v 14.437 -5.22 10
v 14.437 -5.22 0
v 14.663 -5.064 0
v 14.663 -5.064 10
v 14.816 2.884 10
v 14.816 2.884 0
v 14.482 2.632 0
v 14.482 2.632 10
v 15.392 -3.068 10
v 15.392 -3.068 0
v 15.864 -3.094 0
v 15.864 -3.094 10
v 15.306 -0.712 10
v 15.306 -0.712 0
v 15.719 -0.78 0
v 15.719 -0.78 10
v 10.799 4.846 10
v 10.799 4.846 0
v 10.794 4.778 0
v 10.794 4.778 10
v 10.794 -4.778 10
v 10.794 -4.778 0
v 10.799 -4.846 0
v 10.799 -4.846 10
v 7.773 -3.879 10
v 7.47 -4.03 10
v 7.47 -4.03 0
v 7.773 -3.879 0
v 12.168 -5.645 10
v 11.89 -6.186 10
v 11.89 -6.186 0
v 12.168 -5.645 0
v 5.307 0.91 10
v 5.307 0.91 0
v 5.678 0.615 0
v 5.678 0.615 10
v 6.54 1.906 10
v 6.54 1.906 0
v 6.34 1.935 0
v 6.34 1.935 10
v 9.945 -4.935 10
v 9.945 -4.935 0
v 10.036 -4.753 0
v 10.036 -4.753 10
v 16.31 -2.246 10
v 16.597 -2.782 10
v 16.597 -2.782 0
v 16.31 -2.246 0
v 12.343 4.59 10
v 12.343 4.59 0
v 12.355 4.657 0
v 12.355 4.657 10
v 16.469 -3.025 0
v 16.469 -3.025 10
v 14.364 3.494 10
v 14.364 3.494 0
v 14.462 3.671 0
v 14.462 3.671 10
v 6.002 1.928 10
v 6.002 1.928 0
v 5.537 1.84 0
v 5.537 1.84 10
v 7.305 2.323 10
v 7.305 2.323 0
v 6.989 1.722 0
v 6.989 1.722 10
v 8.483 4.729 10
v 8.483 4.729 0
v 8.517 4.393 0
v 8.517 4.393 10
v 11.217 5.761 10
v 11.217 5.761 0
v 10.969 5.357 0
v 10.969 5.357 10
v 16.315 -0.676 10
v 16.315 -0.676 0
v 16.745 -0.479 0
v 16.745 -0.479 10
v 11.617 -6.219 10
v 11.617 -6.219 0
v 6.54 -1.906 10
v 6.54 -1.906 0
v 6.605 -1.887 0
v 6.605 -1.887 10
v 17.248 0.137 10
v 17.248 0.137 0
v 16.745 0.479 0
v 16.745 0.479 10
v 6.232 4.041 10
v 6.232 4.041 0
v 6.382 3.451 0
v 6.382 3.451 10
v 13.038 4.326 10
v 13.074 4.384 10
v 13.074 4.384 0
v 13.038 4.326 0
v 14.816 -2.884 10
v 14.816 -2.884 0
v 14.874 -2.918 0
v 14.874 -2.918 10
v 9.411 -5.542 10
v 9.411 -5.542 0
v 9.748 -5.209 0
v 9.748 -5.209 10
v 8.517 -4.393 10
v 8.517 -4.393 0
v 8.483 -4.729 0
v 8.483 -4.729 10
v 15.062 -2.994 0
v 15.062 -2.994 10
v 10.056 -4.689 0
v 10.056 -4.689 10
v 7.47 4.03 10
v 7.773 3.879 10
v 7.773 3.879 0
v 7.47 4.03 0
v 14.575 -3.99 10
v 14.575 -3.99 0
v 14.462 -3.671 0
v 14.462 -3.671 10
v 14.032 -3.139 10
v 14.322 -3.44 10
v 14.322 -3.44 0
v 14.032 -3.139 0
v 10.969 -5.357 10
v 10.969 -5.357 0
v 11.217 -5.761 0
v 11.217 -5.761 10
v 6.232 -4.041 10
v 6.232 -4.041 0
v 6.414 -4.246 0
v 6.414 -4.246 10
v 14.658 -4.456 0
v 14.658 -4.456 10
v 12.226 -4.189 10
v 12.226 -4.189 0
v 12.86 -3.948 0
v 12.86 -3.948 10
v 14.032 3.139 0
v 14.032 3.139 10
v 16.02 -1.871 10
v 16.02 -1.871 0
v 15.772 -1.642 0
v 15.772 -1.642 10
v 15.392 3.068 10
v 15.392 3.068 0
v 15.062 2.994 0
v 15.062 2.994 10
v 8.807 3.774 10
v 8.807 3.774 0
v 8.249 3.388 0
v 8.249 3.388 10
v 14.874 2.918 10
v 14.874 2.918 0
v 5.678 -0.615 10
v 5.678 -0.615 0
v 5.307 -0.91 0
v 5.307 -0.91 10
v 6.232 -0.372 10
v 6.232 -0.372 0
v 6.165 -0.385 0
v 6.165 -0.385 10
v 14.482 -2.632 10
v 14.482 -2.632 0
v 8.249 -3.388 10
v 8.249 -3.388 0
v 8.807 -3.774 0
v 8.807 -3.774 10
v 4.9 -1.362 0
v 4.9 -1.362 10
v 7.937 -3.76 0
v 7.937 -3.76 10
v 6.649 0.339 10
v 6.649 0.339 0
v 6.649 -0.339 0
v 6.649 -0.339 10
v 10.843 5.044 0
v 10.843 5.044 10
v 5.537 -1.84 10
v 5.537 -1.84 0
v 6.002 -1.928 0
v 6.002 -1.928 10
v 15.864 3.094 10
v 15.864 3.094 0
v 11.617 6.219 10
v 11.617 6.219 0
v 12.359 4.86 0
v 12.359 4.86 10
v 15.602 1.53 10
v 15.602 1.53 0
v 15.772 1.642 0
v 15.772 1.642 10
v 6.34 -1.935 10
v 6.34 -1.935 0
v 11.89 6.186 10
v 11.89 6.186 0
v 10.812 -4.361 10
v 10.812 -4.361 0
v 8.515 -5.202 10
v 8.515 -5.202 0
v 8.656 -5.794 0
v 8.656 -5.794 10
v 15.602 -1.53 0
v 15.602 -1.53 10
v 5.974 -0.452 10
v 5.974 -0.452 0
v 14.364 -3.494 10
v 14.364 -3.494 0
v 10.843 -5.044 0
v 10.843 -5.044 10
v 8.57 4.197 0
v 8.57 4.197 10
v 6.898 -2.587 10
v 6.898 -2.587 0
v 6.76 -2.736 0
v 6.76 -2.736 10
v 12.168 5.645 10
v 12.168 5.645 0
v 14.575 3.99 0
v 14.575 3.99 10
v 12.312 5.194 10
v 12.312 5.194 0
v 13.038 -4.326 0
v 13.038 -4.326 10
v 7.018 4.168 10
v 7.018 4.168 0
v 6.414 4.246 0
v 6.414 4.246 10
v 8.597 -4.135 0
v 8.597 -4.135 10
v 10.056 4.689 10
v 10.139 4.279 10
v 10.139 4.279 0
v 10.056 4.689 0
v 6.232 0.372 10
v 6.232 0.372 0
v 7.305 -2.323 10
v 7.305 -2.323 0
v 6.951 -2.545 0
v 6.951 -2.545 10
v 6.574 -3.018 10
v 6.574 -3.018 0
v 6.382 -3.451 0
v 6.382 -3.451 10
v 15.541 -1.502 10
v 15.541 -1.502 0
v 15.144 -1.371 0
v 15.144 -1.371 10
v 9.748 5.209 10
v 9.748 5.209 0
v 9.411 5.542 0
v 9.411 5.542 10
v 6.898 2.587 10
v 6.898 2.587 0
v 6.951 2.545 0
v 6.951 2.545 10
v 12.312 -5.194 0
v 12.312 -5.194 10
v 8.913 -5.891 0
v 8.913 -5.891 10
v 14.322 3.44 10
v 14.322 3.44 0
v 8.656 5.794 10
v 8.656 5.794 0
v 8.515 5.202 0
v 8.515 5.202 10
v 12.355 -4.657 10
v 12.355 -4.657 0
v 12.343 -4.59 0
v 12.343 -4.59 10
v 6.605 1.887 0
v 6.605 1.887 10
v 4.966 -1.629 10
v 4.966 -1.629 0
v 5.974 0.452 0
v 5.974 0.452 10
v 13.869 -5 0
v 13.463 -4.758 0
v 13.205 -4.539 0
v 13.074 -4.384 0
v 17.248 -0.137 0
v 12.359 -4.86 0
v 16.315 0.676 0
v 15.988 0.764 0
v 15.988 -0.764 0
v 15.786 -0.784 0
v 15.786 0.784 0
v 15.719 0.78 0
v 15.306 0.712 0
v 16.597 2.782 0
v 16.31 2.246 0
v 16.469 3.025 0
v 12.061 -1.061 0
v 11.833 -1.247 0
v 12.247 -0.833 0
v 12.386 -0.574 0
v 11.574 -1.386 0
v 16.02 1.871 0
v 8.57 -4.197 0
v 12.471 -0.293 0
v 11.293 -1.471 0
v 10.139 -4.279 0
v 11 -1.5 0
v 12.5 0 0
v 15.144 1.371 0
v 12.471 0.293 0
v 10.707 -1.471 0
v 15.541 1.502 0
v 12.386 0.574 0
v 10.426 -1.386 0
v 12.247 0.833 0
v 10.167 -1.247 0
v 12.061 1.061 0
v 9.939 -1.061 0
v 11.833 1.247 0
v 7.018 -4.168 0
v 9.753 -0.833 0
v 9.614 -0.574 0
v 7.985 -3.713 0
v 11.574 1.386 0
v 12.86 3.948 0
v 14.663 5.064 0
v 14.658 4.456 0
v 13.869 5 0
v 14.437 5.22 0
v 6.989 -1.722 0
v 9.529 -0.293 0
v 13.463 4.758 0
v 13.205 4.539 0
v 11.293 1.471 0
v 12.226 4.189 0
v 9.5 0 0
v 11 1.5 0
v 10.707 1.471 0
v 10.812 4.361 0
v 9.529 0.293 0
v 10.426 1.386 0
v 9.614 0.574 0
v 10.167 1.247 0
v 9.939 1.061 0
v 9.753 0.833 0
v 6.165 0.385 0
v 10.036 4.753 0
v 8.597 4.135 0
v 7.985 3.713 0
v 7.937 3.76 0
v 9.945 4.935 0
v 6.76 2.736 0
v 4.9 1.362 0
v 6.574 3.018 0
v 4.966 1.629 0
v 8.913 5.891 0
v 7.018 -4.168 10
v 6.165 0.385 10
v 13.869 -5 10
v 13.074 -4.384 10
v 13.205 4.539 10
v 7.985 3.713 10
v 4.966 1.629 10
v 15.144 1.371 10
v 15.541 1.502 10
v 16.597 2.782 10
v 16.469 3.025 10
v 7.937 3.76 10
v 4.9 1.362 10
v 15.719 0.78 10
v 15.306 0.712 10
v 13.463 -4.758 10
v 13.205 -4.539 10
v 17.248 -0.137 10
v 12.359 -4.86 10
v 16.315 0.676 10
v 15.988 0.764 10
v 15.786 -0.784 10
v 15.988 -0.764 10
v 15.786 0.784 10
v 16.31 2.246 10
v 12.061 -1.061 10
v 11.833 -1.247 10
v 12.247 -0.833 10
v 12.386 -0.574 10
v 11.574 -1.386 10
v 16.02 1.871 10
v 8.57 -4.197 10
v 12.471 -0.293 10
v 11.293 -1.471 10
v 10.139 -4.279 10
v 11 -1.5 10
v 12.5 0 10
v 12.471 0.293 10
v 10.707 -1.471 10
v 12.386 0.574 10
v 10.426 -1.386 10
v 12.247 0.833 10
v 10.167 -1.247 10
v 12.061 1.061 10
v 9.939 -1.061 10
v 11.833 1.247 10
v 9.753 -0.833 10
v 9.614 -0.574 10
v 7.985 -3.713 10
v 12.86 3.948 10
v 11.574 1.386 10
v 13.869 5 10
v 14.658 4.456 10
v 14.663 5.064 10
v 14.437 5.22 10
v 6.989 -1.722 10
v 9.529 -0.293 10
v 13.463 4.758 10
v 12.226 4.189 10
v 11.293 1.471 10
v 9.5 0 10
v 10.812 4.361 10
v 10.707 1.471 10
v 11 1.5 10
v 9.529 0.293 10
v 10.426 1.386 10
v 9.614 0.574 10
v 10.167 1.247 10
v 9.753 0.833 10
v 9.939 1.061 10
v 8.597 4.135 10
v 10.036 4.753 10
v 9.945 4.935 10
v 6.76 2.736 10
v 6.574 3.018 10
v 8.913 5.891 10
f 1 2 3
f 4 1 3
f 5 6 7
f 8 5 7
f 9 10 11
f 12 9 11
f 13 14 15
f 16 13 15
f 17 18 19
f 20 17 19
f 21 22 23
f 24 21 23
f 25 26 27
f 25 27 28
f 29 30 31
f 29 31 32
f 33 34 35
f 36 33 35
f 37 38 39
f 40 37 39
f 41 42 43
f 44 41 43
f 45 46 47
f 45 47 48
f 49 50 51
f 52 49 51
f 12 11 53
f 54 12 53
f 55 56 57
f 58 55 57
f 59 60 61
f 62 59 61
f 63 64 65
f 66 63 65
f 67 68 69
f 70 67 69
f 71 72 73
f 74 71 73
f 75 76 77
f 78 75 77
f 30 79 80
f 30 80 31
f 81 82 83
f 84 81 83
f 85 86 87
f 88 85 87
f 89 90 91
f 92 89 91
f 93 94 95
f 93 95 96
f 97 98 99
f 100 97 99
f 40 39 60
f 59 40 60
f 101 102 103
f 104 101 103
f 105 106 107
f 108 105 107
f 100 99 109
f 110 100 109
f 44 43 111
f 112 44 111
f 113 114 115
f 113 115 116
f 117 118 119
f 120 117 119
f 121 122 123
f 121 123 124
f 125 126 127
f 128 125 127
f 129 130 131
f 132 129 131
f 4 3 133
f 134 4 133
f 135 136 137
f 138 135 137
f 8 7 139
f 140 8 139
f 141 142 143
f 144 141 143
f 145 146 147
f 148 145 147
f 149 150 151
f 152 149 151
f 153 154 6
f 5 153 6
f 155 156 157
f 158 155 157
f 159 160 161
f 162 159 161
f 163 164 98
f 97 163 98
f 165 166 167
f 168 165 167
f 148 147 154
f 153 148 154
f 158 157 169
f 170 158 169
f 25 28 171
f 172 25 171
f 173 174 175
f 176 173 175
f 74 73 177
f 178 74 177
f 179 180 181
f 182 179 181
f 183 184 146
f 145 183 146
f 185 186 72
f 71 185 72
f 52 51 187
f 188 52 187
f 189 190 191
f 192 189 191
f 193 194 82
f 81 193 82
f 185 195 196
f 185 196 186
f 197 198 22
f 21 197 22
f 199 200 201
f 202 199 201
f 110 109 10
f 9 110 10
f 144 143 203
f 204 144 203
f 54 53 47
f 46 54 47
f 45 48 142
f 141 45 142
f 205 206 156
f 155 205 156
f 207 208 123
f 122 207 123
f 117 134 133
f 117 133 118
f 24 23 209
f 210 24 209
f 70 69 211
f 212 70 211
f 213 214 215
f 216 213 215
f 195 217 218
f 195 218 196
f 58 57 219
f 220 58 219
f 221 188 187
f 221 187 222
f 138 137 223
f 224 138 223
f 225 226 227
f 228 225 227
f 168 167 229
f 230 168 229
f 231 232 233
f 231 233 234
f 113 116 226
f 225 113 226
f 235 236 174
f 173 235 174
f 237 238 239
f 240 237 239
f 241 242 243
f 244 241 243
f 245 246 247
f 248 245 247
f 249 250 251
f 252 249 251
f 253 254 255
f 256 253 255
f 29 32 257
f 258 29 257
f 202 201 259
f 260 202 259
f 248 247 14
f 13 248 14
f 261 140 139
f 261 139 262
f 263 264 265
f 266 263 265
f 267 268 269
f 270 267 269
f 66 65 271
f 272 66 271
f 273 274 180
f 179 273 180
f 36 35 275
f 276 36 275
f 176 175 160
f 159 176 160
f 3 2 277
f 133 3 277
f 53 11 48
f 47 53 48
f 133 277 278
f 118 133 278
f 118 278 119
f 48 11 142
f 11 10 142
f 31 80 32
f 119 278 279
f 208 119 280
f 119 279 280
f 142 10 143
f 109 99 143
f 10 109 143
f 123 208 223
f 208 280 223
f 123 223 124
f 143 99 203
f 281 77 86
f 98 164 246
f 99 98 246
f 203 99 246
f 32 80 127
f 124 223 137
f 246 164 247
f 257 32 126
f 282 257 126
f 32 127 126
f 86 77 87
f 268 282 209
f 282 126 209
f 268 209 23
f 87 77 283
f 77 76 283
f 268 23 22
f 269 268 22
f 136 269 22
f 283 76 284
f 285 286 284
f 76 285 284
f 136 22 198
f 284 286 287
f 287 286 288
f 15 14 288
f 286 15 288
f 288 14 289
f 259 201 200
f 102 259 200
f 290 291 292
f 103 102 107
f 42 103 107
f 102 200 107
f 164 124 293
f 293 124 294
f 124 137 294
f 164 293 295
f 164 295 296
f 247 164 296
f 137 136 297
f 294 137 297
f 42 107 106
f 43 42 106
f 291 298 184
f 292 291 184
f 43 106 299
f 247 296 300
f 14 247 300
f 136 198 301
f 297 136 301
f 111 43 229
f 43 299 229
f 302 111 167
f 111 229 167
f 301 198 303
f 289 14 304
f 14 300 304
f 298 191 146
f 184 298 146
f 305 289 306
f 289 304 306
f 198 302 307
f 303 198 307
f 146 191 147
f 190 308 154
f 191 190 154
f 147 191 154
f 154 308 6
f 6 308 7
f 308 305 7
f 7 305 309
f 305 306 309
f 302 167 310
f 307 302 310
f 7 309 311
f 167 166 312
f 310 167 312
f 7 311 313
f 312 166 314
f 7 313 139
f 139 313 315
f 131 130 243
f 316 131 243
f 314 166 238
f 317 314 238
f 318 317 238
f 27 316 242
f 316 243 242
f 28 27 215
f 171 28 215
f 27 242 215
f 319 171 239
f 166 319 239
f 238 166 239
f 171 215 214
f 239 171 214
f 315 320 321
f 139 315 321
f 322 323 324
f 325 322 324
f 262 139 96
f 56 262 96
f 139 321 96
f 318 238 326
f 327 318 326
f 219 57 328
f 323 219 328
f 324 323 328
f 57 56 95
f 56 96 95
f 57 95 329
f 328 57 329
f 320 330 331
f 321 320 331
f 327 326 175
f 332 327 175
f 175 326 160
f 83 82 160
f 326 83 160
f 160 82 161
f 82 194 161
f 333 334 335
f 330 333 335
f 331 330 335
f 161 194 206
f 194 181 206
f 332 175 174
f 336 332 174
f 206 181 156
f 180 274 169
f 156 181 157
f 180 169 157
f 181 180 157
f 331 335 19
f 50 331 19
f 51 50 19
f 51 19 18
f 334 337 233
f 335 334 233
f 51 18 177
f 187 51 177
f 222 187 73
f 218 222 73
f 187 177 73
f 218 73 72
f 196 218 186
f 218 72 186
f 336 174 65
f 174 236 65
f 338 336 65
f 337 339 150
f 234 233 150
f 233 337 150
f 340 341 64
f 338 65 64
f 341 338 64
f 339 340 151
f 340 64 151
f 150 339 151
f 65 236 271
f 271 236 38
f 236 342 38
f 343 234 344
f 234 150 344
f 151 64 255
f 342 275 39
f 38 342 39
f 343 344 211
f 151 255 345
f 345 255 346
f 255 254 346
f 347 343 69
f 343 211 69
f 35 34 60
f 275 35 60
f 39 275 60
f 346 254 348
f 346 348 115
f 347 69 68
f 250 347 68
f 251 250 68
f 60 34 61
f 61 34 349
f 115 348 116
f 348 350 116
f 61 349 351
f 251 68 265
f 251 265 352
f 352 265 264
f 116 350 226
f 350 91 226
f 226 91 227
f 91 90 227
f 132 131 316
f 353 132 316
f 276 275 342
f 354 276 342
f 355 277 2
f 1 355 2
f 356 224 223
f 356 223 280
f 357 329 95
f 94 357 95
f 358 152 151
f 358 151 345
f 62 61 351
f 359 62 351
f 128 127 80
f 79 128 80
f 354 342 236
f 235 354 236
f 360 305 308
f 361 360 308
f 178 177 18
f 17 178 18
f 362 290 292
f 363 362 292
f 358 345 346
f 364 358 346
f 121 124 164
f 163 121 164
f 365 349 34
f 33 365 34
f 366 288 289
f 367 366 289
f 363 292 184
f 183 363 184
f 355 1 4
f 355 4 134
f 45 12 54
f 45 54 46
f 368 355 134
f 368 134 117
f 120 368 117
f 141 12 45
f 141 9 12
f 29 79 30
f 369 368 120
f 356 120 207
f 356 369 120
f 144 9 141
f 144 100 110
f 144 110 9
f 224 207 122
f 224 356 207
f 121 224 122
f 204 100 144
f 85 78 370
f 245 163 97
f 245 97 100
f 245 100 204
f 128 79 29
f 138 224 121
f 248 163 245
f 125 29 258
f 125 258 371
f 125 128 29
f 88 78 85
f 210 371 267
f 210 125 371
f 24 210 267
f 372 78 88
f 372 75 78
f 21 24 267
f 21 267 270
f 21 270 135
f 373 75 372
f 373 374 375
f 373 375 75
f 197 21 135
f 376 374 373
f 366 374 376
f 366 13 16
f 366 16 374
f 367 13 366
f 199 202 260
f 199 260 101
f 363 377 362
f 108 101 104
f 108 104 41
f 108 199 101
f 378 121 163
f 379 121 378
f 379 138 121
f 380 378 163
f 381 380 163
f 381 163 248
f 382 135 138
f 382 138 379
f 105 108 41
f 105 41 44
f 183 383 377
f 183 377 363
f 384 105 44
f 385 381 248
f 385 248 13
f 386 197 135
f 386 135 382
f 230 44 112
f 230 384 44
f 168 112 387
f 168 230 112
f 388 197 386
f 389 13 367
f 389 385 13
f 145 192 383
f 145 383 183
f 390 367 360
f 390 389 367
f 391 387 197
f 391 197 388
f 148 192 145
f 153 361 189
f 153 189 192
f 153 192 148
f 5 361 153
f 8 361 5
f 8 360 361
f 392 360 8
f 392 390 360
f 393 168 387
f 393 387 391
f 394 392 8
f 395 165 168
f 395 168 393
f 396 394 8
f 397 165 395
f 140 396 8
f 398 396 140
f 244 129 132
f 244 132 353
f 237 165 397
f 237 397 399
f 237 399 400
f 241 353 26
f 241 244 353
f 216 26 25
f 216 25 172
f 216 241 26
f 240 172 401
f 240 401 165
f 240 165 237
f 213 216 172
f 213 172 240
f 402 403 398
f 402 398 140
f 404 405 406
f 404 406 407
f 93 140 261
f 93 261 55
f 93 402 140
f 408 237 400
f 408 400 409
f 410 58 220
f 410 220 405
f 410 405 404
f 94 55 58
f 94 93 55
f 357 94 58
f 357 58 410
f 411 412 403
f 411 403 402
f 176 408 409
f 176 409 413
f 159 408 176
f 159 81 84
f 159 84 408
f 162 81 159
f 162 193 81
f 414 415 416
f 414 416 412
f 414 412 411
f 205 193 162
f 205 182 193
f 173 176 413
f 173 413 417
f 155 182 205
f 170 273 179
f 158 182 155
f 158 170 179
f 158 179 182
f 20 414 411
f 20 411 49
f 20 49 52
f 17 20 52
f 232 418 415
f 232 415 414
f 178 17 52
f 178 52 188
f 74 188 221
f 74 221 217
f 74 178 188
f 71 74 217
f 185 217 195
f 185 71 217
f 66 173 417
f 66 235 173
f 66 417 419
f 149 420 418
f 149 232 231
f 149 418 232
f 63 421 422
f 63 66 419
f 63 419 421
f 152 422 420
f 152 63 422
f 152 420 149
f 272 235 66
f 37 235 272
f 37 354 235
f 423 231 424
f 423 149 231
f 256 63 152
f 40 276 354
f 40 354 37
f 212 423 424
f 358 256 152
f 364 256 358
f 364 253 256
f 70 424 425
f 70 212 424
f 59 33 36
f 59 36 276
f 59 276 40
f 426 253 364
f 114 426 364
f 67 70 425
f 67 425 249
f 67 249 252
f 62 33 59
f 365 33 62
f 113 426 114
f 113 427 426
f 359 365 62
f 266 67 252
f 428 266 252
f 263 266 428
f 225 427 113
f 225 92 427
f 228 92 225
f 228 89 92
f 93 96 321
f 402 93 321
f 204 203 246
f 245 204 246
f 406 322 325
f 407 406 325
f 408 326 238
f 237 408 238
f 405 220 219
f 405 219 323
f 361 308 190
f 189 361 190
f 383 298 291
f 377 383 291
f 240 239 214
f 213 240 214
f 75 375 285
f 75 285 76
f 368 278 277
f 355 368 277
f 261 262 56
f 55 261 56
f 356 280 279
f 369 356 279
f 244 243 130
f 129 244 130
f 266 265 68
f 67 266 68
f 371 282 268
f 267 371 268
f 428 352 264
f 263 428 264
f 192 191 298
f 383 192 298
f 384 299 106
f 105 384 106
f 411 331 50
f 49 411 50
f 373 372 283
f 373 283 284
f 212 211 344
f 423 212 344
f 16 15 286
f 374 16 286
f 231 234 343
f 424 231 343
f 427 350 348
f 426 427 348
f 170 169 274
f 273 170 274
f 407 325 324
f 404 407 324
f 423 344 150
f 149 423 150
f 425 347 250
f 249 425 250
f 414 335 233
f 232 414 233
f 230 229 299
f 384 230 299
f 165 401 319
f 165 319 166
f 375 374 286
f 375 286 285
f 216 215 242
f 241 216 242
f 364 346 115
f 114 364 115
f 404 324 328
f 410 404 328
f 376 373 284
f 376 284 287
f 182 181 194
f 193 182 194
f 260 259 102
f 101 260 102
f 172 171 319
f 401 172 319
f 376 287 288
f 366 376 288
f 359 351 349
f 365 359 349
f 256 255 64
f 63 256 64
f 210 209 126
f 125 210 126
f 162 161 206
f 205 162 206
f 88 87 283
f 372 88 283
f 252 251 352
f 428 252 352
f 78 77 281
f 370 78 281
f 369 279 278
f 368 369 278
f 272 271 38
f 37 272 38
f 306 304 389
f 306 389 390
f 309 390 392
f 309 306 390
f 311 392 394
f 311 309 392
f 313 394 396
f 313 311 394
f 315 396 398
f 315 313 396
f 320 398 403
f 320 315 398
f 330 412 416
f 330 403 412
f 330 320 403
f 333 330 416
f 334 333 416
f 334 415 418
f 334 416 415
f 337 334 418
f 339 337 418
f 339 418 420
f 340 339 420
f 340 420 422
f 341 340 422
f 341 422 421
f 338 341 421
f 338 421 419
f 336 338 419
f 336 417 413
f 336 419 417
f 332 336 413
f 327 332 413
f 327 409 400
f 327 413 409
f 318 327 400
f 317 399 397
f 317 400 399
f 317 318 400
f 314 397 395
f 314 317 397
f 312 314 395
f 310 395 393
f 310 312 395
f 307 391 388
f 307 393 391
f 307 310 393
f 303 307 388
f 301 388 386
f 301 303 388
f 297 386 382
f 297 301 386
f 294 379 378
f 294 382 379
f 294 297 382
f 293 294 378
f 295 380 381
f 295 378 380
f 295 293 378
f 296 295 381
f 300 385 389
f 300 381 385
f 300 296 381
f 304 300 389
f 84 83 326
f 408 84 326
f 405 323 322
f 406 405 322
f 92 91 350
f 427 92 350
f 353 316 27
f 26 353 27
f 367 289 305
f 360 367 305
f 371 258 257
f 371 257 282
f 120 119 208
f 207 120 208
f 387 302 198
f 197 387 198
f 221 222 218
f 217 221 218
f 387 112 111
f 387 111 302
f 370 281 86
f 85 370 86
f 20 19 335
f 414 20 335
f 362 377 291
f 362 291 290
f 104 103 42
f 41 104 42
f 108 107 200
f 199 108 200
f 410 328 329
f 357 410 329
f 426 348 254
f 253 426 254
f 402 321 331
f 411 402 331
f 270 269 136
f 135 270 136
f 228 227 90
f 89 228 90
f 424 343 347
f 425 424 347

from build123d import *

# Parameters (mm, degrees)
CYLINDER001_R          = 1.5
CYLINDER001_DEPTH      = 12
LINEAREXTRUDE001_DEPTH = 10


with BuildPart() as cylinder001:
    # cylinder001 → cylinder001 (new body)
    with BuildSketch(Plane.XY.offset(-1)):
        Circle(CYLINDER001_R)
    extrude(amount=CYLINDER001_DEPTH)


with BuildPart() as difference002:
    # union001 → LinearExtrude001 (new body)
    with BuildSketch(Plane(origin=(0, 0, 0), x_dir=(0, 1, 0), z_dir=(0, 0, 1))):
        Polygon((0.711931, -4.306123), (1.370771, -4.143733), (1.502069, -4.540636), (1.530367, -4.602072), (1.641751, -4.771632), (1.871155, -5.020002), (2.245545, -5.309618), (2.782207, -5.596589), (3.025427, -5.468937), (3.094113, -4.864255), (3.068442, -4.391617), (2.994354, -4.061731), (2.918082, -3.873743), (2.883597, -3.815555), (2.631538, -3.482032), (3.139447, -3.032064), (3.440155, -3.322487), (3.493763, -3.363735), (3.671187, -3.46211), (3.989737, -3.575421), (4.455834, -3.657875), (5.064387, -3.662577), (5.220426, -3.436516), (5.000234, -2.869177), (4.757857, -2.462607), (4.53895, -2.204938), (4.384052, -2.073928), (4.326475, -2.038431), (3.948292, -1.860249), (4.188912, -1.225786), (4.590143, -1.343197), (4.656779, -1.354807), (4.859597, -1.359461), (5.194318, -1.311756), (5.645345, -1.168159), (6.186377, -0.889514), (6.219486, -0.616832), (5.76086, -0.216806), (5.357304, 0.030555), (5.043726, 0.156979), (4.845688, 0.200998), (4.77821, 0.205671), (4.36054, 0.187693), (4.278749, 0.861305), (4.688584, 0.943805), (4.752983, 0.964491), (4.934732, 1.054624), (5.208943, 1.252418), (5.541575, 1.58917), (5.891142, 2.087328), (5.793738, 2.344162), (5.201743, 2.485233), (4.729457, 2.516719), (4.393046, 2.482935), (4.197235, 2.429879), (4.135314, 2.402658), (3.773841, 2.192639), (3.388376, 2.751081), (3.712928, 3.01459), (3.760337, 3.062835), (3.879381, 3.227107), (4.030263, 3.529677), (4.168298, 3.982437), (4.246318, 4.585986), (4.040715, 4.768136), (3.45097, 4.617935), (3.018149, 4.426332), (2.735972, 4.240079), (2.587247, 4.102103), (2.545069, 4.049224), (2.322601, 3.695276), (1.721767, 4.010618), (1.886685, 4.394771), (1.906243, 4.459522), (1.93531, 4.6603), (1.928298, 4.99833), (1.840114, 5.463378), (1.628715, 6.034052), (1.362012, 6.099788), (0.909622, 5.692724), (0.61542, 5.321926), (0.452121, 5.025874), (0.384552, 4.834585), (0.371779, 4.768162), (0.339281, 4.351371), (-0.339281, 4.351371), (-0.371779, 4.768162), (-0.384552, 4.834585), (-0.452121, 5.025874), (-0.61542, 5.321926), (-0.909622, 5.692724), (-1.362012, 6.099788), (-1.628715, 6.034052), (-1.840114, 5.463378), (-1.928298, 4.99833), (-1.93531, 4.6603), (-1.906243, 4.459522), (-1.886685, 4.394771), (-1.721767, 4.010618), (-2.322601, 3.695276), (-2.545069, 4.049224), (-2.587247, 4.102103), (-2.735972, 4.240079), (-3.018149, 4.426332), (-3.45097, 4.617935), (-4.040715, 4.768136), (-4.246318, 4.585986), (-4.168298, 3.982437), (-4.030263, 3.529677), (-3.879381, 3.227107), (-3.760337, 3.062835), (-3.712928, 3.01459), (-3.388376, 2.751081), (-3.773841, 2.192638), (-4.135314, 2.402658), (-4.197235, 2.429879), (-4.393046, 2.482935), (-4.729457, 2.516719), (-5.201743, 2.485233), (-5.793738, 2.344162), (-5.891142, 2.087328), (-5.541575, 1.58917), (-5.208943, 1.252418), (-4.934732, 1.054624), (-4.752983, 0.964491), (-4.688584, 0.943805), (-4.278749, 0.861305), (-4.36054, 0.187693), (-4.77821, 0.205671), (-4.845688, 0.200998), (-5.043726, 0.156979), (-5.357304, 0.030555), (-5.76086, -0.216806), (-6.219486, -0.616832), (-6.186377, -0.889514), (-5.645345, -1.168159), (-5.194318, -1.311756), (-4.859597, -1.359461), (-4.656779, -1.354807), (-4.590143, -1.343197), (-4.188912, -1.225786), (-3.948292, -1.860249), (-4.326475, -2.038431), (-4.384052, -2.073928), (-4.53895, -2.204938), (-4.757857, -2.462607), (-5.000234, -2.869177), (-5.220426, -3.436516), (-5.064387, -3.662577), (-4.455834, -3.657875), (-3.989737, -3.575421), (-3.671187, -3.46211), (-3.493763, -3.363735), (-3.440155, -3.322487), (-3.139447, -3.032064), (-2.631537, -3.482032), (-2.883597, -3.815555), (-2.918082, -3.873743), (-2.994354, -4.061731), (-3.068442, -4.391617), (-3.094113, -4.864255), (-3.025427, -5.468937), (-2.782207, -5.596589), (-2.245545, -5.309618), (-1.871155, -5.020002), (-1.641751, -4.771632), (-1.530367, -4.602072), (-1.502069, -4.540636), (-1.370771, -4.143733), (-0.71193, -4.306122), (-0.780122, -4.71858), (-0.783616, -4.78613), (-0.763789, -4.98803), (-0.676085, -5.31456), (-0.47917, -5.74499), (-0.137342, -6.24849), (0.137342, -6.24849), (0.47917, -5.74499), (0.676085, -5.31456), (0.763789, -4.98803), (0.783616, -4.78613), (0.780122, -4.71858), align=None)
    extrude(amount=LINEAREXTRUDE001_DEPTH)

    # difference002: cut cylinder001
    add(cylinder001.part, mode=Mode.SUBTRACT)


with BuildPart() as difference002_1:
    # difference002 placement: moved
    add(difference002.part.moved(Location((11, 0, 0))))


solid = difference002_1.part
